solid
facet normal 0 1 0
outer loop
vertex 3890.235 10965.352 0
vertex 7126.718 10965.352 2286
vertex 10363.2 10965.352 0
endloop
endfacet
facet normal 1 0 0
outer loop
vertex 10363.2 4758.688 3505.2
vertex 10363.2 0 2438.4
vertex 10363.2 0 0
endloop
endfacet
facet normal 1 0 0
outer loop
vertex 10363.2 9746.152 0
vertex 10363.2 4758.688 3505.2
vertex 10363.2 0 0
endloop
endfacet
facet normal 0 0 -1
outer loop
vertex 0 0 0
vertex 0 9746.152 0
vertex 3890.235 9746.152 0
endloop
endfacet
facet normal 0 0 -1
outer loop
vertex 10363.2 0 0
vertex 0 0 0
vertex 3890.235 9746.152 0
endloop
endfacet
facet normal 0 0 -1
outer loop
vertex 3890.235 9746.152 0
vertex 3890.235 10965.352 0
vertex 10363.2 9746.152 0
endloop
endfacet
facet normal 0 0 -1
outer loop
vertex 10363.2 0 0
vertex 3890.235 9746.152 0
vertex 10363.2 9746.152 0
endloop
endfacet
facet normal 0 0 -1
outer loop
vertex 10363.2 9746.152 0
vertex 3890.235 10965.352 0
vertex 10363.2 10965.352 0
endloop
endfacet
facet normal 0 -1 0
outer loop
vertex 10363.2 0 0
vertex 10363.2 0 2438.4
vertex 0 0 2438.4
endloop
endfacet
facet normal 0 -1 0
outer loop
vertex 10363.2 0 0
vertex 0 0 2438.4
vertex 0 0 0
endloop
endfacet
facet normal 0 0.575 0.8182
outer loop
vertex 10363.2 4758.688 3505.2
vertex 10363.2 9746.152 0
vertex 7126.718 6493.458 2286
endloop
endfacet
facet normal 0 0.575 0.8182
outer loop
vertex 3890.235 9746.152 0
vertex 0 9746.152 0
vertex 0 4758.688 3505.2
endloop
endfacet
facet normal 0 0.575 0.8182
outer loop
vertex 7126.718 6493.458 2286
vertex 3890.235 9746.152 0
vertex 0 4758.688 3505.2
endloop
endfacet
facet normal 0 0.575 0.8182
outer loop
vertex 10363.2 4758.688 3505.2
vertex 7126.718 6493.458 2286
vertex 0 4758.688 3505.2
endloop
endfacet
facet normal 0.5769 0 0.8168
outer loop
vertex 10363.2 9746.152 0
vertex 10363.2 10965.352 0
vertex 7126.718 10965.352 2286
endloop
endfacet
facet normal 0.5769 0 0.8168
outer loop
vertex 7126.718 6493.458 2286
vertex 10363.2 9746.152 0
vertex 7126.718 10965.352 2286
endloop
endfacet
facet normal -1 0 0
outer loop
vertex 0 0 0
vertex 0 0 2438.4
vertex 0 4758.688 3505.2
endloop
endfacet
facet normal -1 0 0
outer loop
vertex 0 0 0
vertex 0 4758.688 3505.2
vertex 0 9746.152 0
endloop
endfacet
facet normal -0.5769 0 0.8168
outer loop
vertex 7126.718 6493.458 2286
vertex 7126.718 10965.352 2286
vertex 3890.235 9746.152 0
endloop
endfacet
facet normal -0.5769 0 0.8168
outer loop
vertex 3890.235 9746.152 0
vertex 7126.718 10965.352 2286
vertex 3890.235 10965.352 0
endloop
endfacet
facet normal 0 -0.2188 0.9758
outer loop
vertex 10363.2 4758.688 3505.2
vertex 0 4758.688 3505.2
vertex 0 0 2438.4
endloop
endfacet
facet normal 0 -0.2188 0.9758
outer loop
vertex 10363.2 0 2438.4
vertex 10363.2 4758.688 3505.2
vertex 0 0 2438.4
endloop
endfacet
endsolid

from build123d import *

# Parameters (mm, degrees)
F1_DEPTH = 10363.2
F5_DEPTH = 4572


with BuildPart() as f1:
    # F0 (on Right) → F1 (new body)
    with BuildSketch(Plane.YZ):
        Polygon((0, 2438.4), (0, 0), (9746.151653591, 0), (4758.6884747796, 3505.2), align=None)
    extrude(amount=F1_DEPTH)

    # F4 (on face) → F5 (join)
    with BuildSketch(Plane.XZ.offset(-10965.351653591)):
        Polygon((3890.2353747298, 0), (10363.2, 0), (7126.7176873649, 2286), align=None)
    extrude(amount=F5_DEPTH)


solid = f1.part
